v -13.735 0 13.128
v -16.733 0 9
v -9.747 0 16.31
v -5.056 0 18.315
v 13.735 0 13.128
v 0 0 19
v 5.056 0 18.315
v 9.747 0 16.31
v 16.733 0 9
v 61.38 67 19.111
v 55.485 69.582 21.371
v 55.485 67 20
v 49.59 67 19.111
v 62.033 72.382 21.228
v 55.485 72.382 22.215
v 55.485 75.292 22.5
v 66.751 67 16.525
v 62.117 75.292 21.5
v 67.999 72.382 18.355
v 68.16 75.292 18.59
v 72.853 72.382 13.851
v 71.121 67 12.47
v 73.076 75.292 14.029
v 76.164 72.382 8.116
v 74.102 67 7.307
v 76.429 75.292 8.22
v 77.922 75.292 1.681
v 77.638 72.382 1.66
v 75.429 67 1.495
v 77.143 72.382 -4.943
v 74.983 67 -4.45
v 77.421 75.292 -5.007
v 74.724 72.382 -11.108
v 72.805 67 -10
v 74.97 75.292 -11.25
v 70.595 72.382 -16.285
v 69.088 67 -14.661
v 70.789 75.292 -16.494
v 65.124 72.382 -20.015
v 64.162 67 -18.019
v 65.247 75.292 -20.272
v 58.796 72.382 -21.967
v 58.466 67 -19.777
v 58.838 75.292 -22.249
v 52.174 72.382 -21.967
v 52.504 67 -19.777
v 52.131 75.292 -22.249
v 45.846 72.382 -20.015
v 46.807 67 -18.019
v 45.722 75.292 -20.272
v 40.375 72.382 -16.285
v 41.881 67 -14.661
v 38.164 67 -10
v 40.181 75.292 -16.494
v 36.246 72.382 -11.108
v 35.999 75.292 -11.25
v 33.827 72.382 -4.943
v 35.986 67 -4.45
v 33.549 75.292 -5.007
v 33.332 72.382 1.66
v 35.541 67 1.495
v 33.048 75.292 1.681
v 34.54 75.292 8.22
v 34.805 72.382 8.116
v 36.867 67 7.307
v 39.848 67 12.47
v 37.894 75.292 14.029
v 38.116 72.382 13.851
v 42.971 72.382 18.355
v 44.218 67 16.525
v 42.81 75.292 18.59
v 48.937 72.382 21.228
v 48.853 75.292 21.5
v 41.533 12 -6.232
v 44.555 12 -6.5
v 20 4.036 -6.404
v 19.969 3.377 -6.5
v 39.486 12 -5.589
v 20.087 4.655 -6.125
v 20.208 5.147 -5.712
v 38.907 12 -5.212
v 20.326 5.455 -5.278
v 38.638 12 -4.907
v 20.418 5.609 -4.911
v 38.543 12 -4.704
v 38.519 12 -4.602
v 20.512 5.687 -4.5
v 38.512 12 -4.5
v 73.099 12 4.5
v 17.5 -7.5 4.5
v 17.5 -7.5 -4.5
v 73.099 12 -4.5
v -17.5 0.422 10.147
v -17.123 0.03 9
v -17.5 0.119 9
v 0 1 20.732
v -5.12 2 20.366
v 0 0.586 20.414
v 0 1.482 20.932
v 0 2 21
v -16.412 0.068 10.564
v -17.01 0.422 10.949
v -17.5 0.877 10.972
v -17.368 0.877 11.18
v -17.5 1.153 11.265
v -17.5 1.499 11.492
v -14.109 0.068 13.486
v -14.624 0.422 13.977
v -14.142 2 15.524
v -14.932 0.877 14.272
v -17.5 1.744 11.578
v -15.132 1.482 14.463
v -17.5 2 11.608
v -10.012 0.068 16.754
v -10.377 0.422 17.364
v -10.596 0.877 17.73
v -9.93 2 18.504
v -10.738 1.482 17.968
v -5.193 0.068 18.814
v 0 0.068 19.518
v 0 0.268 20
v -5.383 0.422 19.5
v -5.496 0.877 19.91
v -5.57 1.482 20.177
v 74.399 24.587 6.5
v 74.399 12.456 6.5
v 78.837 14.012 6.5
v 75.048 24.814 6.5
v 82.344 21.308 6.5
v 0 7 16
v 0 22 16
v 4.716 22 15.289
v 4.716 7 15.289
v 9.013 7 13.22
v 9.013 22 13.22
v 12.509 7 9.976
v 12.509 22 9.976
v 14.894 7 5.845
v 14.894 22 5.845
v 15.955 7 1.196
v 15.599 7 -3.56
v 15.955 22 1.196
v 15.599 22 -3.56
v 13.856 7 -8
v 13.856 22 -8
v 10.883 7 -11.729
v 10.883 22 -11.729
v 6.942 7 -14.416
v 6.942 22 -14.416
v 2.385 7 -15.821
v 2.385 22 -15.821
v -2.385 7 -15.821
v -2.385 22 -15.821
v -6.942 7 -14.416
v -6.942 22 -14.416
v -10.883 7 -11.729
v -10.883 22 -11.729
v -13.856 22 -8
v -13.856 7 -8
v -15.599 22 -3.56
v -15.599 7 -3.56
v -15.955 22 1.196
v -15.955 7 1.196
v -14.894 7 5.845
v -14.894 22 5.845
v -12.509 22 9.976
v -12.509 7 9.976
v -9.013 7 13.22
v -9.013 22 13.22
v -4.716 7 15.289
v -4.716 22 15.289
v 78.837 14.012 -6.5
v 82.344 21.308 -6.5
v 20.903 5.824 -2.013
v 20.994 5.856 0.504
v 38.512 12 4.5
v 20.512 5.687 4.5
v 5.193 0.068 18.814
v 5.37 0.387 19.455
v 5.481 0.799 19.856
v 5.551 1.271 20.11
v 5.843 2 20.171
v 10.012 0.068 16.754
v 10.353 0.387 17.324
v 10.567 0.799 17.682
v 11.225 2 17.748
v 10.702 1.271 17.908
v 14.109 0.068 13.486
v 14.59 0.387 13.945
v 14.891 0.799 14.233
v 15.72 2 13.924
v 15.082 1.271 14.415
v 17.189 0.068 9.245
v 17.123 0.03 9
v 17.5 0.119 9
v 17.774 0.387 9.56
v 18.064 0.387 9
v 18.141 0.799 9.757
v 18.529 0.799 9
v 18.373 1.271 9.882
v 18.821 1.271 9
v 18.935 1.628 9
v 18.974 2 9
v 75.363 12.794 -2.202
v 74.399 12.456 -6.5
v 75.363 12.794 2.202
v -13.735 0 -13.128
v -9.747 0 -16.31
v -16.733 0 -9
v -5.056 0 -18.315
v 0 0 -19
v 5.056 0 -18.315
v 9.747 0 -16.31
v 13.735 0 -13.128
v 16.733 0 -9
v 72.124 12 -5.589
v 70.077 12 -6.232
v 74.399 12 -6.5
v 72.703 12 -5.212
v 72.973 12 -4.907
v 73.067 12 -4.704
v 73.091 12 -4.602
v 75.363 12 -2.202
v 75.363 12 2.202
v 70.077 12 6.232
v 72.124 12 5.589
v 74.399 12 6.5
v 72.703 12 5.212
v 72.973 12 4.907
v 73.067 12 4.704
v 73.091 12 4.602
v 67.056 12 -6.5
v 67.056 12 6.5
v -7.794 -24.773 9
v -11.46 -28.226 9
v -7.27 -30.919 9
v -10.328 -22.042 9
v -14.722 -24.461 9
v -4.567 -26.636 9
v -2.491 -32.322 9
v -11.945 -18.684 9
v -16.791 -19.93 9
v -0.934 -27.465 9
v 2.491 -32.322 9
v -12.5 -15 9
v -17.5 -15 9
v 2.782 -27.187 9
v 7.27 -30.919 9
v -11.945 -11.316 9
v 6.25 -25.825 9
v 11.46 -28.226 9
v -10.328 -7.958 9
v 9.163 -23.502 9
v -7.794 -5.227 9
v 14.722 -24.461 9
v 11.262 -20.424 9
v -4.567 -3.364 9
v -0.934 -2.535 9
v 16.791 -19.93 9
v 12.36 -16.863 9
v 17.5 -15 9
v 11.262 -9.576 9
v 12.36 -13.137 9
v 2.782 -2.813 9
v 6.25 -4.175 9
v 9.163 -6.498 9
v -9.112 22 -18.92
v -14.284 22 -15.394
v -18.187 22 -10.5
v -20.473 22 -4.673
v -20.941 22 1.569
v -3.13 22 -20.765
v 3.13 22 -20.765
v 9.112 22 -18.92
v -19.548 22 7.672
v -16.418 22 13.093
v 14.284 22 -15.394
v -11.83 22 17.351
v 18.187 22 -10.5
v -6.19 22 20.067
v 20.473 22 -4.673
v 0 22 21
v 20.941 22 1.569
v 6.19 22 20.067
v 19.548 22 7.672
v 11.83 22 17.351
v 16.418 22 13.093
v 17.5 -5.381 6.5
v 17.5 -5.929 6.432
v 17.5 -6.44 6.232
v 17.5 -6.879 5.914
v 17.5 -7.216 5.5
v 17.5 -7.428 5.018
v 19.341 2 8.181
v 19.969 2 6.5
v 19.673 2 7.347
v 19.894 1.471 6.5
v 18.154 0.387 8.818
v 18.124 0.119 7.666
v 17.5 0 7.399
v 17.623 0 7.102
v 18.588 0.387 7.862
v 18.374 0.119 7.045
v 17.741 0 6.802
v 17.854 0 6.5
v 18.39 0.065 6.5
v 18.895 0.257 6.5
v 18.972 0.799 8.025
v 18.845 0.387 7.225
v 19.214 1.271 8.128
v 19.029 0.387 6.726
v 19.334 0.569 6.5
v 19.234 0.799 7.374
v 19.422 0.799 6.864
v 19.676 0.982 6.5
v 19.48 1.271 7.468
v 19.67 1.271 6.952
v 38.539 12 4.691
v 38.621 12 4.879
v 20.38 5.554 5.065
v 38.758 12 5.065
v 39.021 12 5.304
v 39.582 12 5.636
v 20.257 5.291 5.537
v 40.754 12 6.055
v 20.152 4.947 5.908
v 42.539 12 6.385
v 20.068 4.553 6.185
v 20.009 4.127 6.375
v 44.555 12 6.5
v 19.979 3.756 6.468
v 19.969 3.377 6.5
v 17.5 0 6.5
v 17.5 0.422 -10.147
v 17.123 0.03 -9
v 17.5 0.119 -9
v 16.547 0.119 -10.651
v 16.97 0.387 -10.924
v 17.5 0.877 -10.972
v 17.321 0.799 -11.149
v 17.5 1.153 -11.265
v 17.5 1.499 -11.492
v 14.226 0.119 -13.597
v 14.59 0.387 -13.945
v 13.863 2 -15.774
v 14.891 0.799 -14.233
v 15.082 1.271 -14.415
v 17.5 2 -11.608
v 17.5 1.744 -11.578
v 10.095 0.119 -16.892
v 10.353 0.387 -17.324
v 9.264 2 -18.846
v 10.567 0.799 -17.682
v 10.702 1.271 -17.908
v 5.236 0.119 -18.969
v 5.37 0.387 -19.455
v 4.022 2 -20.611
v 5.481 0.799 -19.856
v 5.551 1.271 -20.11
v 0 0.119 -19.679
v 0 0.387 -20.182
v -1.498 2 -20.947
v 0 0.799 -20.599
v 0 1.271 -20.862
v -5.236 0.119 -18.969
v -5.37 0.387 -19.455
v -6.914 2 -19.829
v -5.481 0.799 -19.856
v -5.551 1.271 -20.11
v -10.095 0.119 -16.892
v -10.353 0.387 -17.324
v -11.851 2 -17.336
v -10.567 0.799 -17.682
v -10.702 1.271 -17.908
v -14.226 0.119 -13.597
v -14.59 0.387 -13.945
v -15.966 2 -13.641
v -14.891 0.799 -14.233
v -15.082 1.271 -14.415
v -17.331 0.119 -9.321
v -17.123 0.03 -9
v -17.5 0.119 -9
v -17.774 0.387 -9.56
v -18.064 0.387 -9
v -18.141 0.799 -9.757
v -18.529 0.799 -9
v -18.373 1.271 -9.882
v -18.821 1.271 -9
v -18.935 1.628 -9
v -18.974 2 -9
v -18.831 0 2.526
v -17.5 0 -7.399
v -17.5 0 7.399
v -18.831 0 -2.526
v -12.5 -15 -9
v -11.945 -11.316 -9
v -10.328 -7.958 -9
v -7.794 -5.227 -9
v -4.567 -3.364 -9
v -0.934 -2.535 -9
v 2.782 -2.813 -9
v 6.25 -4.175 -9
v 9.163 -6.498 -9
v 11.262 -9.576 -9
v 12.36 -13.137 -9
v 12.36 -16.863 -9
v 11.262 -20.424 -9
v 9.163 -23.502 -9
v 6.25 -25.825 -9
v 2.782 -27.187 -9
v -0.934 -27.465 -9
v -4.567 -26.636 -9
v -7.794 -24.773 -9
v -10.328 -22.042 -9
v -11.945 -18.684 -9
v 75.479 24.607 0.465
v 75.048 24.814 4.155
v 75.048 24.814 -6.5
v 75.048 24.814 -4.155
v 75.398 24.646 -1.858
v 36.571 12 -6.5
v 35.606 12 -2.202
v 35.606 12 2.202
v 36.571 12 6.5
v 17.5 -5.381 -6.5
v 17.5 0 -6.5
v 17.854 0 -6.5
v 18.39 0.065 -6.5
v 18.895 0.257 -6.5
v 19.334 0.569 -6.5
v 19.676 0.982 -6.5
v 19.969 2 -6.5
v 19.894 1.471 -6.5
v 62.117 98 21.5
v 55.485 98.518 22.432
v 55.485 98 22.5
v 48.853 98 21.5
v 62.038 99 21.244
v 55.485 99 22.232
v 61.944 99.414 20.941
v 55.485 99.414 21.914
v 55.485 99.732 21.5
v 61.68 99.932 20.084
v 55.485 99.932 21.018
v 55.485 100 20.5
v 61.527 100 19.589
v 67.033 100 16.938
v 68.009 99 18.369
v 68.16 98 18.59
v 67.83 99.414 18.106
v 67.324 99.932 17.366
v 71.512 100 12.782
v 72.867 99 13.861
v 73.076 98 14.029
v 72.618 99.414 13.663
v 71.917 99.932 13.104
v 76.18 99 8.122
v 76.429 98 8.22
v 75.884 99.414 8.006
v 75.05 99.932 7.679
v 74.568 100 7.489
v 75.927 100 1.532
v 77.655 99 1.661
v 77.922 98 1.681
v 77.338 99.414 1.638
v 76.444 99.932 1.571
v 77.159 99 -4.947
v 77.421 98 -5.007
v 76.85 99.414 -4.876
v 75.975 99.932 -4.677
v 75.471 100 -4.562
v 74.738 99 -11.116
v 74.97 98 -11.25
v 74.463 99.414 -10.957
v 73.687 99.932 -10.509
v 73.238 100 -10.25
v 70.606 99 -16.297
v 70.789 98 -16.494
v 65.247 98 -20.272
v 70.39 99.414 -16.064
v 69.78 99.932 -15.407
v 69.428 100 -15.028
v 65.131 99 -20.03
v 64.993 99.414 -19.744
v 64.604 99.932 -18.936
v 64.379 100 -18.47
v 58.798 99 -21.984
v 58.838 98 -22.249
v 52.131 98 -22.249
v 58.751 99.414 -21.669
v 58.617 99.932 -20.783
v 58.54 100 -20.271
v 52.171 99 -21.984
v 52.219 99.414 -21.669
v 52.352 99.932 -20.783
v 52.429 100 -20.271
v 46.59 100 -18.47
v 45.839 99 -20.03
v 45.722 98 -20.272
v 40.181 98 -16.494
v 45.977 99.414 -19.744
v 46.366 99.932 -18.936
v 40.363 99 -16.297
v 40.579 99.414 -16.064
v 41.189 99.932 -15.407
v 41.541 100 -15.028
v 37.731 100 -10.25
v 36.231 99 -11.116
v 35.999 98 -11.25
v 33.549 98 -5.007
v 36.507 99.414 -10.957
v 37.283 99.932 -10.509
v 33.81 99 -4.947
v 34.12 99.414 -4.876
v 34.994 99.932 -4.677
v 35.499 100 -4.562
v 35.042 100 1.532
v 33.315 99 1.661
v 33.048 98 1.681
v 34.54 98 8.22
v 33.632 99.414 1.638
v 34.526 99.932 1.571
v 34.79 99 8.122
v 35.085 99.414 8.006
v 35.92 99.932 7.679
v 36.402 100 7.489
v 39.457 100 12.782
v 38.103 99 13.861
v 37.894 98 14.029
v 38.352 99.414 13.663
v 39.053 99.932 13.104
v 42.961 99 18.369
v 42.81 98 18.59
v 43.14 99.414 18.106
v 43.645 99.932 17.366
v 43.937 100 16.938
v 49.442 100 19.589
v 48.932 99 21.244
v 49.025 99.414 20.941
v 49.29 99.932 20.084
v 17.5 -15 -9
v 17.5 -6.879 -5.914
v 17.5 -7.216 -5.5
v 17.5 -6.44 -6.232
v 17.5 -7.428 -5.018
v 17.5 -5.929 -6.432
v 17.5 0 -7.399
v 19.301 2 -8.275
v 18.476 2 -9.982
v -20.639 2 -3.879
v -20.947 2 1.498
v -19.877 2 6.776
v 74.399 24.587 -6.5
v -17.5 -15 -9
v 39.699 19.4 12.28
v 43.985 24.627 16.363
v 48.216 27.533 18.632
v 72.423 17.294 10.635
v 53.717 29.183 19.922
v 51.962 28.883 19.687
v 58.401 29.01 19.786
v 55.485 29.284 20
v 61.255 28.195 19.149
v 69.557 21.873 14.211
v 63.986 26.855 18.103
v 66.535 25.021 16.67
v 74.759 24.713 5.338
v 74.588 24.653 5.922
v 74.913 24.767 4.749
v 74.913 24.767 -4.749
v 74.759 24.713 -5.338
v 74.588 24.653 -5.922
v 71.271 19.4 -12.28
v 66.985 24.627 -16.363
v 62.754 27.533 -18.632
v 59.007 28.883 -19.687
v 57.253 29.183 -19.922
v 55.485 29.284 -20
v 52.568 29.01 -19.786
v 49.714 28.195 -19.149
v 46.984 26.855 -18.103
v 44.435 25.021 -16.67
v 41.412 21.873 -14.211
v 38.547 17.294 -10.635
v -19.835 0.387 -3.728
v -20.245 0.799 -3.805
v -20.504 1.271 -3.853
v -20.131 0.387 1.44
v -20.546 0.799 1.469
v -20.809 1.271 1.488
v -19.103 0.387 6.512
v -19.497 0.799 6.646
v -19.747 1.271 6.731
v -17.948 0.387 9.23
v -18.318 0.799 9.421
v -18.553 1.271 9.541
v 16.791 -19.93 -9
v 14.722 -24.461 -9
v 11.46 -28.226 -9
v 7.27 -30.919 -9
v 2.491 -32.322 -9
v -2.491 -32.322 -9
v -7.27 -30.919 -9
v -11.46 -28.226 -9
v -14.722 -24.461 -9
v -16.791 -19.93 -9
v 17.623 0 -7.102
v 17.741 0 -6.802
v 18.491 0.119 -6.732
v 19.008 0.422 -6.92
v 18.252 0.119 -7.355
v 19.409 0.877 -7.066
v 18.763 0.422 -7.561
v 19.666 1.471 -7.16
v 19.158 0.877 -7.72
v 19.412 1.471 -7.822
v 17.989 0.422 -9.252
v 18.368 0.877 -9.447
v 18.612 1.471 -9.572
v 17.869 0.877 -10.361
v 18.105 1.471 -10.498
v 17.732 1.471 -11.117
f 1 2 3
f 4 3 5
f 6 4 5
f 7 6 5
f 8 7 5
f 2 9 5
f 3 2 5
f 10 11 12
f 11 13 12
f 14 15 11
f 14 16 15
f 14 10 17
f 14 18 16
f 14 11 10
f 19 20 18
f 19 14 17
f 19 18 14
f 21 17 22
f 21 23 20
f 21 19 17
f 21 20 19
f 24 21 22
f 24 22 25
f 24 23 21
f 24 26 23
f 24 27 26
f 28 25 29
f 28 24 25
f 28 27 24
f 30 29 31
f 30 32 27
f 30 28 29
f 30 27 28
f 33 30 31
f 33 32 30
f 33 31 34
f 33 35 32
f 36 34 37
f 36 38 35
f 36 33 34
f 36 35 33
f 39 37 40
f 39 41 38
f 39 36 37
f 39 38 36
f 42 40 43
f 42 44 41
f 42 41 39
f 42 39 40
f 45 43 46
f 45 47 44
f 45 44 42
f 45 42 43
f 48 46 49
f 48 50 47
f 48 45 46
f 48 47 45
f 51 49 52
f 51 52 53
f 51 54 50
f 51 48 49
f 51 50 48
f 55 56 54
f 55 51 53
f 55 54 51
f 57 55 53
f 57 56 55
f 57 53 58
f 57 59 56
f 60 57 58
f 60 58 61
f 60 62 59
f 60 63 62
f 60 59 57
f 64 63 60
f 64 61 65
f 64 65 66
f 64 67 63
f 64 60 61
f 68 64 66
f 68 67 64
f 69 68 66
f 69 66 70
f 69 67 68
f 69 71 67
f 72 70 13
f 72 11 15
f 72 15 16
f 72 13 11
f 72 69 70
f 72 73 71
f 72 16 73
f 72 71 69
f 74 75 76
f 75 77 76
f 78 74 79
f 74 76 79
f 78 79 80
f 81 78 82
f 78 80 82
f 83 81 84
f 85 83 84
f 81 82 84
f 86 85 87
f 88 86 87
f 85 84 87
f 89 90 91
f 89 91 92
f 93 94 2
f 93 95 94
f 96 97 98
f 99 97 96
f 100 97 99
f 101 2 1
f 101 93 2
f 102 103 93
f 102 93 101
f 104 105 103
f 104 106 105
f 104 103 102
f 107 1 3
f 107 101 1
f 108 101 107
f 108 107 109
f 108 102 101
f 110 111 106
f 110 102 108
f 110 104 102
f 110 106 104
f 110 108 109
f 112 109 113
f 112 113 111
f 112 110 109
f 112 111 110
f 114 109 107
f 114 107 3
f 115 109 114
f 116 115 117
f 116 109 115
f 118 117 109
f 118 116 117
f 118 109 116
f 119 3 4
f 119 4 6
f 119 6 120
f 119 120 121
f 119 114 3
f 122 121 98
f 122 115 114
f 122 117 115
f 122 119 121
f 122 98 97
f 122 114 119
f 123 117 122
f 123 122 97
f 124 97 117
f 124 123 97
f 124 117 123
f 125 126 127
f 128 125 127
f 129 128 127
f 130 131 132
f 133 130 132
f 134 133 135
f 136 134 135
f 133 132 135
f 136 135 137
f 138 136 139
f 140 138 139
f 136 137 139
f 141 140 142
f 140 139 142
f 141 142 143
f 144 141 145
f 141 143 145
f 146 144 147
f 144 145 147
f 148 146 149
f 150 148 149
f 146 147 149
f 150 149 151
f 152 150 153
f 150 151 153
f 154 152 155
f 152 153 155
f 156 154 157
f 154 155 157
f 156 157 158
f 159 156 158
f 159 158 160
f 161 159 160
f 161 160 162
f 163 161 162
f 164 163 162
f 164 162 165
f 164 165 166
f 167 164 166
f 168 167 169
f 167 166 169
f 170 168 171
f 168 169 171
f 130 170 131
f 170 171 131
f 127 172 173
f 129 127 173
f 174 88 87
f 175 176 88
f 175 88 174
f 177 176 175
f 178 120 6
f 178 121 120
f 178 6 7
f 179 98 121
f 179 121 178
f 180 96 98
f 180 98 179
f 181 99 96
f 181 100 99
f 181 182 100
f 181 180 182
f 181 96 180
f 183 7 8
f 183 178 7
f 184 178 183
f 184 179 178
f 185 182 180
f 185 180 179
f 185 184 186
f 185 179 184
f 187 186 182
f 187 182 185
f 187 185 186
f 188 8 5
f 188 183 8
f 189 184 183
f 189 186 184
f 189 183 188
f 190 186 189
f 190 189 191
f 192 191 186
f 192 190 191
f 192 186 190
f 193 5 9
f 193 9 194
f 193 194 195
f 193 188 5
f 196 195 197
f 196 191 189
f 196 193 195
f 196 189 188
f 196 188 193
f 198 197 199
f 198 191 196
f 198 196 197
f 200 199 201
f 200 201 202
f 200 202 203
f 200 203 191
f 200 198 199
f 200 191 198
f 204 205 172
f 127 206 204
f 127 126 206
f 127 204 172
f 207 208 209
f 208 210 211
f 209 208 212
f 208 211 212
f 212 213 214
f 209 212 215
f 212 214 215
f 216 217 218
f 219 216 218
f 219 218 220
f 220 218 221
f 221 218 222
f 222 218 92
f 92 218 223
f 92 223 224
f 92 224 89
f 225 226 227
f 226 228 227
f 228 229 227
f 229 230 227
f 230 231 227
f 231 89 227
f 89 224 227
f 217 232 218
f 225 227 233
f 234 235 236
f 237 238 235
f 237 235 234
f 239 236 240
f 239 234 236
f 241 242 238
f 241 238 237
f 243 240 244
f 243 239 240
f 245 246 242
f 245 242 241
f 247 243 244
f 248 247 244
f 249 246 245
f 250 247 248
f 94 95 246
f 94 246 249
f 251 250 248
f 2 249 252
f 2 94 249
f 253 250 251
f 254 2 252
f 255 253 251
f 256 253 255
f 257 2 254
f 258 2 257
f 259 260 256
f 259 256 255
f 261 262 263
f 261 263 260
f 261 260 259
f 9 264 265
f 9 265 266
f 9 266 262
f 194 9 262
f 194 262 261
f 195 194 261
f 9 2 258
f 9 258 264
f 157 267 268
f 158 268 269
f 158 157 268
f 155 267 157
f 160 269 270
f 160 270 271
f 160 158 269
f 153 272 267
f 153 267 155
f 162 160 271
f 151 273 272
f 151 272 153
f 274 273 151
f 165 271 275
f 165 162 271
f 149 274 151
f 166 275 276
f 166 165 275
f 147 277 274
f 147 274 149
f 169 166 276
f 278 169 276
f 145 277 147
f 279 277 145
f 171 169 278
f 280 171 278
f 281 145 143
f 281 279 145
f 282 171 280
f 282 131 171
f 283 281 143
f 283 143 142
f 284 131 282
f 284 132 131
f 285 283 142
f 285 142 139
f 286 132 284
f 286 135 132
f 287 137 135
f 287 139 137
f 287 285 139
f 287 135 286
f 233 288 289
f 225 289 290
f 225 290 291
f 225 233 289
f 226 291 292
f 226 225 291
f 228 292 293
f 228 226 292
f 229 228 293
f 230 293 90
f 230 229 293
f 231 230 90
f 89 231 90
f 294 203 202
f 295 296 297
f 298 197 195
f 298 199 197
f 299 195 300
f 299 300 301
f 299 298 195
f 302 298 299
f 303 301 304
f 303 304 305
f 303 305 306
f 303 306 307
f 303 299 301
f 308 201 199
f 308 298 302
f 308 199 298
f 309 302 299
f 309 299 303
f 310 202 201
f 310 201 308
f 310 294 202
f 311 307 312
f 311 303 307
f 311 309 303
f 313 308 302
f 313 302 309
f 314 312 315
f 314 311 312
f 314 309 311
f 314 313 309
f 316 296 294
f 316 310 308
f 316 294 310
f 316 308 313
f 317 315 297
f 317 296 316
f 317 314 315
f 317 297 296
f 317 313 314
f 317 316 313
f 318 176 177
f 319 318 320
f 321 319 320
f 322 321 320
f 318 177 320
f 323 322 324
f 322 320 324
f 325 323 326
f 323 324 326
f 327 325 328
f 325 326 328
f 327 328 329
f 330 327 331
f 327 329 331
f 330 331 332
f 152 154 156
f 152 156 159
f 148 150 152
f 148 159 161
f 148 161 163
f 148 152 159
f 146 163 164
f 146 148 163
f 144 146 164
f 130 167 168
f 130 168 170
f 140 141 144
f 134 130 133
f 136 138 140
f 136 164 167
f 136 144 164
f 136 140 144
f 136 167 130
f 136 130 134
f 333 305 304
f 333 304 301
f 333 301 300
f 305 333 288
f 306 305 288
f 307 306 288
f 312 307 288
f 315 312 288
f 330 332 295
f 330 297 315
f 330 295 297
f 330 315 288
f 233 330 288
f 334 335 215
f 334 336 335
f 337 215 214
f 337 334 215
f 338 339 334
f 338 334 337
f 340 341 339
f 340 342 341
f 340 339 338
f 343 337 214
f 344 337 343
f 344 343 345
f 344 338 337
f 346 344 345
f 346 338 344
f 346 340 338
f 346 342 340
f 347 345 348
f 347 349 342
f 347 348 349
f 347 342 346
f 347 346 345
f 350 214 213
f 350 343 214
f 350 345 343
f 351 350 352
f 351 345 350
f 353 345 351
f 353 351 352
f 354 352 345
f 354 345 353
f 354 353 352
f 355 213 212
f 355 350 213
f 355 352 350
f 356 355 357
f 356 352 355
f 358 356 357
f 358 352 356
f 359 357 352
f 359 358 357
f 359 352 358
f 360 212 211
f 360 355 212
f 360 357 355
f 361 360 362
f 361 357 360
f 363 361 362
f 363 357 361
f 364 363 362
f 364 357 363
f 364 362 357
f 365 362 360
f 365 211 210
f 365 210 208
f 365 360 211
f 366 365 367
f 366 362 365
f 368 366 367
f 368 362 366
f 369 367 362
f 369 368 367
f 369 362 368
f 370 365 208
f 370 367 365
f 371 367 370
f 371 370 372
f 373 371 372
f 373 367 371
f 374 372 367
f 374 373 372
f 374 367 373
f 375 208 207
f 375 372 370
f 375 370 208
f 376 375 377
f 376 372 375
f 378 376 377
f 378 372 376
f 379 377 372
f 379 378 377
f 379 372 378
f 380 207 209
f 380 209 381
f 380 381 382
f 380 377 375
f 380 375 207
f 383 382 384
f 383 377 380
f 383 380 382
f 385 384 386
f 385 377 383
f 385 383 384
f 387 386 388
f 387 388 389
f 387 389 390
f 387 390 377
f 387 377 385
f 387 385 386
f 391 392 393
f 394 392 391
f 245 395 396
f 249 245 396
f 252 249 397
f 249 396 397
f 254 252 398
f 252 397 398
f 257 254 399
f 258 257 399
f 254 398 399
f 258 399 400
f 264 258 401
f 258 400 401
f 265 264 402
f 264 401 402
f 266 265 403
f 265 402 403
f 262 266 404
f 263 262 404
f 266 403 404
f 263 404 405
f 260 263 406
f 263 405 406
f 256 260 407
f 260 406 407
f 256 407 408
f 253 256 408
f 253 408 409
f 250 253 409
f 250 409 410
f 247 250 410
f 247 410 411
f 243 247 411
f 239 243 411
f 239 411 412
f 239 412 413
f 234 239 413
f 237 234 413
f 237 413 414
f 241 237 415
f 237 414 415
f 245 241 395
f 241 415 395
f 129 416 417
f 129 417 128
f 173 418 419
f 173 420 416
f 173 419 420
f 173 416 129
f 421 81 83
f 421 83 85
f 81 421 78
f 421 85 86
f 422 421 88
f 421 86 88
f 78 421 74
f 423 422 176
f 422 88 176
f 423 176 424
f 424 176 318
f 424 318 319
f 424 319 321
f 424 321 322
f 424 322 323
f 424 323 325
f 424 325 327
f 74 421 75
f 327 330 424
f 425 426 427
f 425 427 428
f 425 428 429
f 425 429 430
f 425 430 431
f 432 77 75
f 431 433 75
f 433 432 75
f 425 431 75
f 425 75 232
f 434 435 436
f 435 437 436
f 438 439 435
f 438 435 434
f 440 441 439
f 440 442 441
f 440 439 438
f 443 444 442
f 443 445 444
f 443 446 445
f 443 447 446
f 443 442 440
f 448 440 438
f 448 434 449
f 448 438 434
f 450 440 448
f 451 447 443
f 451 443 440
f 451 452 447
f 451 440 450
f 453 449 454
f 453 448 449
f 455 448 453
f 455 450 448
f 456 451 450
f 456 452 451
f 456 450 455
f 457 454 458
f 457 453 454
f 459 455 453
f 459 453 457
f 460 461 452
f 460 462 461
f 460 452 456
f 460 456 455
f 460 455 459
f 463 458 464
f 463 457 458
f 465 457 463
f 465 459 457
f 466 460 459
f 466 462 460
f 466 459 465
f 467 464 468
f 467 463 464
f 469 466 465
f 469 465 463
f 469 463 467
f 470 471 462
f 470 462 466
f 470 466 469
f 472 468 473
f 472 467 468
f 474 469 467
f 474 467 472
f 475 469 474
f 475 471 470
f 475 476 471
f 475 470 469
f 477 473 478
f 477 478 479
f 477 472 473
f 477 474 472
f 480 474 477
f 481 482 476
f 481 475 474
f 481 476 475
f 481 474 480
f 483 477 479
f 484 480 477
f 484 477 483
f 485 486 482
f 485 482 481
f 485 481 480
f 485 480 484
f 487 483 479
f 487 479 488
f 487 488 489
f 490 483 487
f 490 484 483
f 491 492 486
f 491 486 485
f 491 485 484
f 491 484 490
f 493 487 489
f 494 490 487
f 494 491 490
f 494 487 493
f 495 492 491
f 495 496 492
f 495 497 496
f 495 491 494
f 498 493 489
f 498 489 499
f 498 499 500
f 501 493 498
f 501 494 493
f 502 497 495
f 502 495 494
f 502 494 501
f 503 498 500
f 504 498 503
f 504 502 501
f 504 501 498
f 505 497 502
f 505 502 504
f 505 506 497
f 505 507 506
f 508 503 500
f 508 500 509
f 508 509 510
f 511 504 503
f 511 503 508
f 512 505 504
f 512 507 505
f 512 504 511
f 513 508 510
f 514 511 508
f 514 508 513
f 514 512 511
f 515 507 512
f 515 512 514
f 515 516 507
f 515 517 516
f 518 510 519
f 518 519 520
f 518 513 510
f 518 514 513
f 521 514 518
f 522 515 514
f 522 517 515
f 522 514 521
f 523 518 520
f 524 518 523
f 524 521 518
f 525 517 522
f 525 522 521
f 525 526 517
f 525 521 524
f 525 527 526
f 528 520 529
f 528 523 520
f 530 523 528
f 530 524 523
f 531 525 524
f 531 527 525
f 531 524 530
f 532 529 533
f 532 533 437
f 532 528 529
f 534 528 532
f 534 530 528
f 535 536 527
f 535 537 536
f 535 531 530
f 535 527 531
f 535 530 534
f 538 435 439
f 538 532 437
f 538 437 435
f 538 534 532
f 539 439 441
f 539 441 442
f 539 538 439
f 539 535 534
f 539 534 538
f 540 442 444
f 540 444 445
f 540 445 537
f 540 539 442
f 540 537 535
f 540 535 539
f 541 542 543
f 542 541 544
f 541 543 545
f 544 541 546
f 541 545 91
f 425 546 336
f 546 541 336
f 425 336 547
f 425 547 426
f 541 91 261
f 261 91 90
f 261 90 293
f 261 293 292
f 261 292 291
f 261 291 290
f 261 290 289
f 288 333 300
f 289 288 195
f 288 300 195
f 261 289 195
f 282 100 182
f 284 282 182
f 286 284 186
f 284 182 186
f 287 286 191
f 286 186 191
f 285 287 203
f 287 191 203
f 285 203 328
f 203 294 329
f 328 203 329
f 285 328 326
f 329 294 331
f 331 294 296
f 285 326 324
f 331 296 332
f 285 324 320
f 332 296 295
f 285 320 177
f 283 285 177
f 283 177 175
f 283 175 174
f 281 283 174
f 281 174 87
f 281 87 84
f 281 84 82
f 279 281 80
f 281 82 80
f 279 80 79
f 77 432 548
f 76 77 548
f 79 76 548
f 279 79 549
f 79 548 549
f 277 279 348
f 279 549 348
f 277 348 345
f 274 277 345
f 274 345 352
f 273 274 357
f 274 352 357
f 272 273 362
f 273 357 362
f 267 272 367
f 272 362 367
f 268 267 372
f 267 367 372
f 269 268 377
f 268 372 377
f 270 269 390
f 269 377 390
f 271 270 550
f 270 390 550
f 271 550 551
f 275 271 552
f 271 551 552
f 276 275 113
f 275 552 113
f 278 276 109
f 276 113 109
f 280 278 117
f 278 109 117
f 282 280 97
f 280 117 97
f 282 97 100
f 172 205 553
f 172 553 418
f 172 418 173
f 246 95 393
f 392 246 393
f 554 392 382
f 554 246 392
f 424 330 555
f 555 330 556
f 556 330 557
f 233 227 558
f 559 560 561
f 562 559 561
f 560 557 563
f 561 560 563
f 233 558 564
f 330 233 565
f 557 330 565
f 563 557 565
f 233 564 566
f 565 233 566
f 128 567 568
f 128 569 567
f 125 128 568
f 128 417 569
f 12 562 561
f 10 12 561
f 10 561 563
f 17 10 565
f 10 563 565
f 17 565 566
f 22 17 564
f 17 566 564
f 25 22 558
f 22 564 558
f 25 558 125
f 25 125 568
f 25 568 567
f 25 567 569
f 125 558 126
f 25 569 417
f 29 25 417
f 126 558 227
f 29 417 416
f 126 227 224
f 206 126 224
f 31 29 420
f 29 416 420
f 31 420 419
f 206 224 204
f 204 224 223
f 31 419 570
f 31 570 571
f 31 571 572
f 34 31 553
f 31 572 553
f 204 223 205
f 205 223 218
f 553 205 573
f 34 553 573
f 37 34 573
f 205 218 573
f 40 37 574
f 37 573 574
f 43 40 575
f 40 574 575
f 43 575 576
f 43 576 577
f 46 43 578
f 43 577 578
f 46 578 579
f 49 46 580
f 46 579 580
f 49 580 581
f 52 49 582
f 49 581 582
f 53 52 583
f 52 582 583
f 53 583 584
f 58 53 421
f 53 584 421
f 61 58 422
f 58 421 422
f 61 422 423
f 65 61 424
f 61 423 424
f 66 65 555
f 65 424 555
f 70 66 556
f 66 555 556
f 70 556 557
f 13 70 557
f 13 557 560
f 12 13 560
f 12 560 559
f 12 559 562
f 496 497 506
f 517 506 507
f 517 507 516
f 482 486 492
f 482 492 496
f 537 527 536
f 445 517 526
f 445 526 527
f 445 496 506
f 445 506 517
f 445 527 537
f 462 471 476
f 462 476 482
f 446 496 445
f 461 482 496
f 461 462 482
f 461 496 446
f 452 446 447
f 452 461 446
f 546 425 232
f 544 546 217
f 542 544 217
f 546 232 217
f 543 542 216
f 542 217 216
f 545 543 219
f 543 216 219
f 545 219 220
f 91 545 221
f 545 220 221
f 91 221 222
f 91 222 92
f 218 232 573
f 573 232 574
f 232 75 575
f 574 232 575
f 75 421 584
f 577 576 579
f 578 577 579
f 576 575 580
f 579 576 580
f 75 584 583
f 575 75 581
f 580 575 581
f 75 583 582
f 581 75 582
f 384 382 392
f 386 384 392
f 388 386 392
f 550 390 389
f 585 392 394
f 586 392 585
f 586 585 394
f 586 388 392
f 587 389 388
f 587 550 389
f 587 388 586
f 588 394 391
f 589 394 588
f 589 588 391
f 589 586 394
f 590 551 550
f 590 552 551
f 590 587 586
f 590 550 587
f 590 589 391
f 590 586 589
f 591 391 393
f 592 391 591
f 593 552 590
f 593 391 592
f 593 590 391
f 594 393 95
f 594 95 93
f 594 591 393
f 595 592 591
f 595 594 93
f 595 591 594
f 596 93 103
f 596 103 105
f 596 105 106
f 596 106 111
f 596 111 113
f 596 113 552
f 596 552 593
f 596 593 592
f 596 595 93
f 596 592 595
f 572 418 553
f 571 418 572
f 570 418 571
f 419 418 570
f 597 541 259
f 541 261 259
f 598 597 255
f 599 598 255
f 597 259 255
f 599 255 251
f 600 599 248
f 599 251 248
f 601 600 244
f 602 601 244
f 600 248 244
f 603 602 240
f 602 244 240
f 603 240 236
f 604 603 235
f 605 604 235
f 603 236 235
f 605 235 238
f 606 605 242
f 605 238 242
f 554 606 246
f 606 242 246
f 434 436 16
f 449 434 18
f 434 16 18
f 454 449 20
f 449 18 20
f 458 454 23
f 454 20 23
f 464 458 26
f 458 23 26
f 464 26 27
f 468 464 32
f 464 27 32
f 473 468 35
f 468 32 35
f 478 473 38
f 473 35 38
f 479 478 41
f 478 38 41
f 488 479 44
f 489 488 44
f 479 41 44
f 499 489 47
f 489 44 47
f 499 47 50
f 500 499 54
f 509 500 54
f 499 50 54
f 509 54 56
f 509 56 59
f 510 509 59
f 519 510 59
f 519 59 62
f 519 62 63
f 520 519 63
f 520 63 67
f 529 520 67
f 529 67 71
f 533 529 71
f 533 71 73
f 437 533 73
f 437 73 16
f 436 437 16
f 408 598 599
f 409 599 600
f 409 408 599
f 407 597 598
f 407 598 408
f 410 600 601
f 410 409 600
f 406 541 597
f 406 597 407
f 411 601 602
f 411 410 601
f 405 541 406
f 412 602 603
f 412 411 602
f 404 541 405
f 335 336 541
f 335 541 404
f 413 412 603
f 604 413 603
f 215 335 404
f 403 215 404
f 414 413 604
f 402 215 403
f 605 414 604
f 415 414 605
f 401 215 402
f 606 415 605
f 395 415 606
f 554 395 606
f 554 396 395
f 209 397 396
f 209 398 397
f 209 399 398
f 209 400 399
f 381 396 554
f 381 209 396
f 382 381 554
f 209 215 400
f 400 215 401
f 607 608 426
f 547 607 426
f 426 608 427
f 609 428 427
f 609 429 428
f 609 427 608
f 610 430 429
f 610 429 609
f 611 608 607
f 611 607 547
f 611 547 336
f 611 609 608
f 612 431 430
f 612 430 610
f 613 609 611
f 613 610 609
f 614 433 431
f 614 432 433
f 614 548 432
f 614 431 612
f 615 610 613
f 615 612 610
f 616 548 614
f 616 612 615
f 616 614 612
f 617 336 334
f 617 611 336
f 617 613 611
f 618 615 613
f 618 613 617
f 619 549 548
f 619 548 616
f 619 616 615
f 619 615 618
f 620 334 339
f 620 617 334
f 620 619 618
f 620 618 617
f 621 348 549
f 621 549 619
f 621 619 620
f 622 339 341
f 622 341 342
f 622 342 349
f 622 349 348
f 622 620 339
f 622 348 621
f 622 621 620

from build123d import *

# Parameters (mm, degrees)
SKETCH1_R           = 21
BOSS_EXTRUDE1_DEPTH = 22
SKETCH3_W           = 35
SKETCH3_H           = 18
BOSS_EXTRUDE2_DEPTH = 15
BOSS_EXTRUDE3_DEPTH = 9
SKETCH6_R           = 12.5
CUT_EXTRUDE1_DEPTH  = 18
BOSS_EXTRUDE5_DEPTH = 6.5
SKETCH9_R           = 20
BOSS_EXTRUDE6_DEPTH = 55
SKETCH10_R          = 22.5
BOSS_EXTRUDE7_DEPTH = 33
FILLET1_R           = 15
CHAMFER2_SIZE       = 10
FILLET3_R           = 2
FILLET4_R           = 2
FILLET5_R           = 2
CUT_EXTRUDE4_DEPTH  = 25
SKETCH13_R          = 16
CUT_EXTRUDE6_DEPTH  = 15


with BuildPart() as part:
    # Sketch1 → Boss-Extrude1 (new body)
    with BuildSketch(Plane(origin=(0, 0, 0), x_dir=(1, 0, 0), z_dir=(0, 1, 0))):
        with Locations(Location((0, 0, 0), (0, 0, 270))):
            Circle(SKETCH1_R)
    extrude(amount=BOSS_EXTRUDE1_DEPTH)

    # Sketch3 → Boss-Extrude2 (add)
    with BuildSketch(Plane.XZ):
        Rectangle(SKETCH3_W, SKETCH3_H)
    extrude(amount=BOSS_EXTRUDE2_DEPTH)

    # Sketch5 → Boss-Extrude3 (add, symmetric)
    with BuildSketch(Plane.XY):
        with BuildLine():
            Line((-17.5, -15), (17.5, -15))
            ThreePointArc((17.5, -15), (0, -32.5), (-17.5, -15))
        make_face()
    extrude(amount=BOSS_EXTRUDE3_DEPTH, both=True)

    # Sketch6 → Cut-Extrude1 (cut)
    with BuildSketch(Plane(origin=(0, 0, -9), x_dir=(-1, 0, 0), z_dir=(0, 0, -1))):
        with Locations((0, -15)):
            Circle(SKETCH6_R)
    extrude(amount=-CUT_EXTRUDE1_DEPTH, mode=Mode.SUBTRACT)

    # Sketch7 → Boss-Extrude5 (add, symmetric)
    with BuildSketch(Plane.XY):
        Polygon((17.5, -7.5), (88.273330058, 17.322081953), (84.484801337, 28.124028145), (17.5, 4.63068359), align=None)
    extrude(amount=BOSS_EXTRUDE5_DEPTH, both=True)

    # Sketch9 → Boss-Extrude6 (add)
    with BuildSketch(Plane(origin=(0, 12, 0), x_dir=(1, 0, 0), z_dir=(0, 1, 0))):
        with Locations(Location((55.484801337, 0, 0), (0, 0, 270))):
            Circle(SKETCH9_R)
    extrude(amount=BOSS_EXTRUDE6_DEPTH)

    # Sketch10 → Boss-Extrude7 (add)
    with BuildSketch(Plane(origin=(0, 67, 0), x_dir=(1, 0, 0), z_dir=(0, 1, 0))):
        with Locations(Location((55.484801337, 0, 0), (0, 0, 270))):
            Circle(SKETCH10_R)
    extrude(amount=BOSS_EXTRUDE7_DEPTH)

    # Fillet1
    # the kernel refuses this fillet: 15 mm, written as the material it takes off along each edge
    with BuildSketch(Plane(origin=(55.484801337, 67, 0), x_dir=(0, 0, 1), z_dir=(-1, 0, 0))) as fillet1_piece_1:
        with BuildLine():
            CenterArc((7.5, 8.291561976), FILLET1_R, 326.442690238, 33.557309762)
            Line((20, 0), (20.25, -0.16583124))
            ThreePointArc((20.25, -0.16583124), (21.25, -0.3), (22.5, -0.3))
            Line((22.5, -0.3), (22.8, 0))
            Line((22.8, 0), (22.8, 8.291561976))
            Line((22.8, 8.291561976), (22.5, 8.291561976))
        make_face()
    revolve(axis=Axis((55.484801337, 67, 0), (0, 1, 0)), mode=Mode.SUBTRACT)

    # Chamfer2
    # the kernel refuses this chamfer: 10 mm, written as the material it takes off along each edge
    with BuildSketch(Plane(origin=(84.484801337, 28.124028145, -32.21682988), x_dir=(-0.9523876901556013, -0.30488963189993584, 0), z_dir=(0, 0, 1))) as chamfer2_piece_1_section:
        Polygon((CHAMFER2_SIZE * 0.999621916911, CHAMFER2_SIZE * 0.0274958766106), (-CHAMFER2_SIZE * 0.0274958766106, CHAMFER2_SIZE * 0.999621916911), (0, 0), align=None)
    chamfer2_piece_1 = extrude(amount=64.433659759, mode=Mode.PRIVATE)
    chamfer2_piece_1 = chamfer2_piece_1 - Plane(origin=(55.484801337, 23.91959175, 0), x_dir=(0, 0, 1), z_dir=(0, -1, 0)) * Cylinder(20, 169, mode=Mode.PRIVATE)
    add(chamfer2_piece_1, mode=Mode.SUBTRACT)
    with BuildSketch(Plane(origin=(88.273330058, 17.322081953, -32.21682988), x_dir=(-0.9341875594200248, -0.3567822919160335, 0), z_dir=(0, 0, 1))) as chamfer2_piece_2:
        Polygon((CHAMFER2_SIZE * 0.999621916911, -CHAMFER2_SIZE * 0.0274958766106), (-CHAMFER2_SIZE * 0.0274958766106, -CHAMFER2_SIZE * 0.999621916911), (0, 0), align=None)
    extrude(amount=64.433659759, mode=Mode.SUBTRACT)

    # Fillet3
    fillet3_edges = [part.edges().sort_by_distance(p)[0] for p in [
        (45.299439603, 2.25, -6.5),
        (29.240150797, 8.748265524, -6.5),
        (29.240150797, 8.748265524, 6.5),
        (45.299439603, 2.25, 6.5),
    ]]
    fillet(fillet3_edges, radius=FILLET3_R)

    # Fillet4
    # the kernel refuses this fillet: 2 mm, written as the material it takes off along each edge
    with BuildSketch(Plane(origin=(0, 0, 0), x_dir=(0.9971250818764672, 0, -0.07577315548958338), z_dir=(0.07577315548958338, 0, 0.9971250818764672))) as fillet4_piece_1_section:
        with BuildLine():
            CenterArc((21 - FILLET4_R, FILLET4_R), FILLET4_R, 270, 90)
            Line((21 - FILLET4_R, 0), (21, 0))
            Line((21, 0), (21, FILLET4_R))
        make_face()
    fillet4_piece_1 = revolve(axis=Axis((0, 0, 0), (0, 1, 0)), revolution_arc=265.654352731, mode=Mode.PRIVATE)
    fillet4_piece_1 = split(fillet4_piece_1, bisect_by=Plane(origin=(19.021746519, 0.448100529, -6.5), z_dir=(0, 0, -1)), keep=Keep.TOP, mode=Mode.PRIVATE)
    fillet4_piece_1 = split(fillet4_piece_1, bisect_by=Plane(origin=(17.5, 0.448100529, -7.756660991), z_dir=(1, 0, 0)), keep=Keep.TOP, mode=Mode.PRIVATE)
    add(fillet4_piece_1, mode=Mode.SUBTRACT)
    with BuildSketch(Plane(origin=(0, 0, 0), x_dir=(0.9971250818764672, 0, -0.07577315548958338), z_dir=(0.07577315548958338, 0, 0.9971250818764672))) as fillet4_piece_2_section:
        with BuildLine():
            CenterArc((21 - FILLET4_R, FILLET4_R), FILLET4_R, 270, 90)
            Line((21 - FILLET4_R, 0), (21, 0))
            Line((21, 0), (21, FILLET4_R))
        make_face()
    fillet4_piece_2 = revolve(axis=Axis((0, 0, 0), (0, 1, 0)), revolution_arc=265.654352731, mode=Mode.PRIVATE)
    fillet4_piece_2 = split(fillet4_piece_2, bisect_by=Plane(origin=(0, 0.562448444, -9), z_dir=(0, 0, -1)), keep=Keep.TOP, mode=Mode.PRIVATE)
    add(fillet4_piece_2, mode=Mode.SUBTRACT)
    with BuildSketch(Plane(origin=(0, 0, 0), x_dir=(0.9971250818764672, 0, -0.07577315548958338), z_dir=(0.07577315548958338, 0, 0.9971250818764672))) as fillet4_piece_3_section:
        with BuildLine():
            CenterArc((21 - FILLET4_R, FILLET4_R), FILLET4_R, 270, 90)
            Line((21 - FILLET4_R, 0), (21, 0))
            Line((21, 0), (21, FILLET4_R))
        make_face()
    fillet4_piece_3 = revolve(axis=Axis((0, 0, 0), (0, 1, 0)), revolution_arc=265.654352731, mode=Mode.PRIVATE)
    fillet4_piece_3 = split(fillet4_piece_3, bisect_by=Plane(origin=(-17.5, 0.448099897, -7.756661101), z_dir=(-1, 0, 0)), keep=Keep.TOP, mode=Mode.PRIVATE)
    add(fillet4_piece_3, mode=Mode.SUBTRACT)
    with BuildSketch(Plane(origin=(0, 0, 0), x_dir=(0.9971250818764672, 0, -0.07577315548958338), z_dir=(0.07577315548958338, 0, 0.9971250818764672))) as fillet4_piece_4_section:
        with BuildLine():
            CenterArc((21 - FILLET4_R, FILLET4_R), FILLET4_R, 270, 90)
            Line((21 - FILLET4_R, 0), (21, 0))
            Line((21, 0), (21, FILLET4_R))
        make_face()
    fillet4_piece_4 = revolve(axis=Axis((0, 0, 0), (0, 1, 0)), revolution_arc=265.654352731, mode=Mode.PRIVATE)
    fillet4_piece_4 = split(fillet4_piece_4, bisect_by=Plane(origin=(-10.643200487, 0.567263166, 9), z_dir=(0, 0, 1)), keep=Keep.TOP, mode=Mode.PRIVATE)
    add(fillet4_piece_4, mode=Mode.SUBTRACT)
    with BuildSketch(Plane(origin=(0, 0, 0), x_dir=(0, 0, 1), z_dir=(-1, 0, 0))) as fillet4_piece_5_section:
        with BuildLine():
            CenterArc((21 - FILLET4_R, FILLET4_R), FILLET4_R, 270, 90)
            Line((21 - FILLET4_R, 0), (21, 0))
            Line((21, 0), (21, FILLET4_R))
        make_face()
    fillet4_piece_5 = revolve(axis=Axis((0, 0, 0), (0, 1, 0)), revolution_arc=85.61482077, mode=Mode.PRIVATE)
    fillet4_piece_5 = split(fillet4_piece_5, bisect_by=Plane(origin=(10.643200508, 0.567263125, 9), z_dir=(0, 0, 1)), keep=Keep.TOP, mode=Mode.PRIVATE)
    add(fillet4_piece_5, mode=Mode.SUBTRACT)
    with BuildSketch(Plane(origin=(0, 0, 0), x_dir=(0, 0, 1), z_dir=(-1, 0, 0))) as fillet4_piece_6_section:
        with BuildLine():
            CenterArc((21 - FILLET4_R, FILLET4_R), FILLET4_R, 270, 90)
            Line((21 - FILLET4_R, 0), (21, 0))
            Line((21, 0), (21, FILLET4_R))
        make_face()
    fillet4_piece_6 = revolve(axis=Axis((0, 0, 0), (0, 1, 0)), revolution_arc=85.61482077, mode=Mode.PRIVATE)
    fillet4_piece_6 = split(fillet4_piece_6, bisect_by=Plane(origin=(19.021746751, 0.448100278, 6.5), z_dir=(0, 0, 1)), keep=Keep.TOP, mode=Mode.PRIVATE)
    fillet4_piece_6 = split(fillet4_piece_6, bisect_by=Plane(origin=(17.5, 0.448100278, 7.756660688), z_dir=(1, 0, 0)), keep=Keep.TOP, mode=Mode.PRIVATE)
    add(fillet4_piece_6, mode=Mode.SUBTRACT)

    # Fillet5
    fillet5_edges = [part.edges().sort_by_distance(p)[0] for p in [
        (55.484801337, 100, -22.5),
    ]]
    fillet(fillet5_edges, radius=FILLET5_R)

    # Sketch12 → Cut-Extrude4 (cut, symmetric)
    with BuildSketch(Plane(origin=(55, 0, 0), x_dir=(0, 0, -1), z_dir=(1, 0, 0))):
        Polygon((6.5, 12), (20, 29.283691076), (20, 12), align=None)
        Polygon((-20, 12), (-6.5, 12), (-20, 29.283691076), align=None)
    extrude(amount=CUT_EXTRUDE4_DEPTH, both=True, mode=Mode.SUBTRACT)

    # Sketch13 → Cut-Extrude6 (cut)
    with BuildSketch(Plane(origin=(0, 22, 0), x_dir=(1, 0, 0), z_dir=(0, 1, 0))):
        with Locations(Location((0, 0, 0), (0, 0, 270))):
            Circle(SKETCH13_R)
    extrude(amount=-CUT_EXTRUDE6_DEPTH, mode=Mode.SUBTRACT)


solid = part.part
